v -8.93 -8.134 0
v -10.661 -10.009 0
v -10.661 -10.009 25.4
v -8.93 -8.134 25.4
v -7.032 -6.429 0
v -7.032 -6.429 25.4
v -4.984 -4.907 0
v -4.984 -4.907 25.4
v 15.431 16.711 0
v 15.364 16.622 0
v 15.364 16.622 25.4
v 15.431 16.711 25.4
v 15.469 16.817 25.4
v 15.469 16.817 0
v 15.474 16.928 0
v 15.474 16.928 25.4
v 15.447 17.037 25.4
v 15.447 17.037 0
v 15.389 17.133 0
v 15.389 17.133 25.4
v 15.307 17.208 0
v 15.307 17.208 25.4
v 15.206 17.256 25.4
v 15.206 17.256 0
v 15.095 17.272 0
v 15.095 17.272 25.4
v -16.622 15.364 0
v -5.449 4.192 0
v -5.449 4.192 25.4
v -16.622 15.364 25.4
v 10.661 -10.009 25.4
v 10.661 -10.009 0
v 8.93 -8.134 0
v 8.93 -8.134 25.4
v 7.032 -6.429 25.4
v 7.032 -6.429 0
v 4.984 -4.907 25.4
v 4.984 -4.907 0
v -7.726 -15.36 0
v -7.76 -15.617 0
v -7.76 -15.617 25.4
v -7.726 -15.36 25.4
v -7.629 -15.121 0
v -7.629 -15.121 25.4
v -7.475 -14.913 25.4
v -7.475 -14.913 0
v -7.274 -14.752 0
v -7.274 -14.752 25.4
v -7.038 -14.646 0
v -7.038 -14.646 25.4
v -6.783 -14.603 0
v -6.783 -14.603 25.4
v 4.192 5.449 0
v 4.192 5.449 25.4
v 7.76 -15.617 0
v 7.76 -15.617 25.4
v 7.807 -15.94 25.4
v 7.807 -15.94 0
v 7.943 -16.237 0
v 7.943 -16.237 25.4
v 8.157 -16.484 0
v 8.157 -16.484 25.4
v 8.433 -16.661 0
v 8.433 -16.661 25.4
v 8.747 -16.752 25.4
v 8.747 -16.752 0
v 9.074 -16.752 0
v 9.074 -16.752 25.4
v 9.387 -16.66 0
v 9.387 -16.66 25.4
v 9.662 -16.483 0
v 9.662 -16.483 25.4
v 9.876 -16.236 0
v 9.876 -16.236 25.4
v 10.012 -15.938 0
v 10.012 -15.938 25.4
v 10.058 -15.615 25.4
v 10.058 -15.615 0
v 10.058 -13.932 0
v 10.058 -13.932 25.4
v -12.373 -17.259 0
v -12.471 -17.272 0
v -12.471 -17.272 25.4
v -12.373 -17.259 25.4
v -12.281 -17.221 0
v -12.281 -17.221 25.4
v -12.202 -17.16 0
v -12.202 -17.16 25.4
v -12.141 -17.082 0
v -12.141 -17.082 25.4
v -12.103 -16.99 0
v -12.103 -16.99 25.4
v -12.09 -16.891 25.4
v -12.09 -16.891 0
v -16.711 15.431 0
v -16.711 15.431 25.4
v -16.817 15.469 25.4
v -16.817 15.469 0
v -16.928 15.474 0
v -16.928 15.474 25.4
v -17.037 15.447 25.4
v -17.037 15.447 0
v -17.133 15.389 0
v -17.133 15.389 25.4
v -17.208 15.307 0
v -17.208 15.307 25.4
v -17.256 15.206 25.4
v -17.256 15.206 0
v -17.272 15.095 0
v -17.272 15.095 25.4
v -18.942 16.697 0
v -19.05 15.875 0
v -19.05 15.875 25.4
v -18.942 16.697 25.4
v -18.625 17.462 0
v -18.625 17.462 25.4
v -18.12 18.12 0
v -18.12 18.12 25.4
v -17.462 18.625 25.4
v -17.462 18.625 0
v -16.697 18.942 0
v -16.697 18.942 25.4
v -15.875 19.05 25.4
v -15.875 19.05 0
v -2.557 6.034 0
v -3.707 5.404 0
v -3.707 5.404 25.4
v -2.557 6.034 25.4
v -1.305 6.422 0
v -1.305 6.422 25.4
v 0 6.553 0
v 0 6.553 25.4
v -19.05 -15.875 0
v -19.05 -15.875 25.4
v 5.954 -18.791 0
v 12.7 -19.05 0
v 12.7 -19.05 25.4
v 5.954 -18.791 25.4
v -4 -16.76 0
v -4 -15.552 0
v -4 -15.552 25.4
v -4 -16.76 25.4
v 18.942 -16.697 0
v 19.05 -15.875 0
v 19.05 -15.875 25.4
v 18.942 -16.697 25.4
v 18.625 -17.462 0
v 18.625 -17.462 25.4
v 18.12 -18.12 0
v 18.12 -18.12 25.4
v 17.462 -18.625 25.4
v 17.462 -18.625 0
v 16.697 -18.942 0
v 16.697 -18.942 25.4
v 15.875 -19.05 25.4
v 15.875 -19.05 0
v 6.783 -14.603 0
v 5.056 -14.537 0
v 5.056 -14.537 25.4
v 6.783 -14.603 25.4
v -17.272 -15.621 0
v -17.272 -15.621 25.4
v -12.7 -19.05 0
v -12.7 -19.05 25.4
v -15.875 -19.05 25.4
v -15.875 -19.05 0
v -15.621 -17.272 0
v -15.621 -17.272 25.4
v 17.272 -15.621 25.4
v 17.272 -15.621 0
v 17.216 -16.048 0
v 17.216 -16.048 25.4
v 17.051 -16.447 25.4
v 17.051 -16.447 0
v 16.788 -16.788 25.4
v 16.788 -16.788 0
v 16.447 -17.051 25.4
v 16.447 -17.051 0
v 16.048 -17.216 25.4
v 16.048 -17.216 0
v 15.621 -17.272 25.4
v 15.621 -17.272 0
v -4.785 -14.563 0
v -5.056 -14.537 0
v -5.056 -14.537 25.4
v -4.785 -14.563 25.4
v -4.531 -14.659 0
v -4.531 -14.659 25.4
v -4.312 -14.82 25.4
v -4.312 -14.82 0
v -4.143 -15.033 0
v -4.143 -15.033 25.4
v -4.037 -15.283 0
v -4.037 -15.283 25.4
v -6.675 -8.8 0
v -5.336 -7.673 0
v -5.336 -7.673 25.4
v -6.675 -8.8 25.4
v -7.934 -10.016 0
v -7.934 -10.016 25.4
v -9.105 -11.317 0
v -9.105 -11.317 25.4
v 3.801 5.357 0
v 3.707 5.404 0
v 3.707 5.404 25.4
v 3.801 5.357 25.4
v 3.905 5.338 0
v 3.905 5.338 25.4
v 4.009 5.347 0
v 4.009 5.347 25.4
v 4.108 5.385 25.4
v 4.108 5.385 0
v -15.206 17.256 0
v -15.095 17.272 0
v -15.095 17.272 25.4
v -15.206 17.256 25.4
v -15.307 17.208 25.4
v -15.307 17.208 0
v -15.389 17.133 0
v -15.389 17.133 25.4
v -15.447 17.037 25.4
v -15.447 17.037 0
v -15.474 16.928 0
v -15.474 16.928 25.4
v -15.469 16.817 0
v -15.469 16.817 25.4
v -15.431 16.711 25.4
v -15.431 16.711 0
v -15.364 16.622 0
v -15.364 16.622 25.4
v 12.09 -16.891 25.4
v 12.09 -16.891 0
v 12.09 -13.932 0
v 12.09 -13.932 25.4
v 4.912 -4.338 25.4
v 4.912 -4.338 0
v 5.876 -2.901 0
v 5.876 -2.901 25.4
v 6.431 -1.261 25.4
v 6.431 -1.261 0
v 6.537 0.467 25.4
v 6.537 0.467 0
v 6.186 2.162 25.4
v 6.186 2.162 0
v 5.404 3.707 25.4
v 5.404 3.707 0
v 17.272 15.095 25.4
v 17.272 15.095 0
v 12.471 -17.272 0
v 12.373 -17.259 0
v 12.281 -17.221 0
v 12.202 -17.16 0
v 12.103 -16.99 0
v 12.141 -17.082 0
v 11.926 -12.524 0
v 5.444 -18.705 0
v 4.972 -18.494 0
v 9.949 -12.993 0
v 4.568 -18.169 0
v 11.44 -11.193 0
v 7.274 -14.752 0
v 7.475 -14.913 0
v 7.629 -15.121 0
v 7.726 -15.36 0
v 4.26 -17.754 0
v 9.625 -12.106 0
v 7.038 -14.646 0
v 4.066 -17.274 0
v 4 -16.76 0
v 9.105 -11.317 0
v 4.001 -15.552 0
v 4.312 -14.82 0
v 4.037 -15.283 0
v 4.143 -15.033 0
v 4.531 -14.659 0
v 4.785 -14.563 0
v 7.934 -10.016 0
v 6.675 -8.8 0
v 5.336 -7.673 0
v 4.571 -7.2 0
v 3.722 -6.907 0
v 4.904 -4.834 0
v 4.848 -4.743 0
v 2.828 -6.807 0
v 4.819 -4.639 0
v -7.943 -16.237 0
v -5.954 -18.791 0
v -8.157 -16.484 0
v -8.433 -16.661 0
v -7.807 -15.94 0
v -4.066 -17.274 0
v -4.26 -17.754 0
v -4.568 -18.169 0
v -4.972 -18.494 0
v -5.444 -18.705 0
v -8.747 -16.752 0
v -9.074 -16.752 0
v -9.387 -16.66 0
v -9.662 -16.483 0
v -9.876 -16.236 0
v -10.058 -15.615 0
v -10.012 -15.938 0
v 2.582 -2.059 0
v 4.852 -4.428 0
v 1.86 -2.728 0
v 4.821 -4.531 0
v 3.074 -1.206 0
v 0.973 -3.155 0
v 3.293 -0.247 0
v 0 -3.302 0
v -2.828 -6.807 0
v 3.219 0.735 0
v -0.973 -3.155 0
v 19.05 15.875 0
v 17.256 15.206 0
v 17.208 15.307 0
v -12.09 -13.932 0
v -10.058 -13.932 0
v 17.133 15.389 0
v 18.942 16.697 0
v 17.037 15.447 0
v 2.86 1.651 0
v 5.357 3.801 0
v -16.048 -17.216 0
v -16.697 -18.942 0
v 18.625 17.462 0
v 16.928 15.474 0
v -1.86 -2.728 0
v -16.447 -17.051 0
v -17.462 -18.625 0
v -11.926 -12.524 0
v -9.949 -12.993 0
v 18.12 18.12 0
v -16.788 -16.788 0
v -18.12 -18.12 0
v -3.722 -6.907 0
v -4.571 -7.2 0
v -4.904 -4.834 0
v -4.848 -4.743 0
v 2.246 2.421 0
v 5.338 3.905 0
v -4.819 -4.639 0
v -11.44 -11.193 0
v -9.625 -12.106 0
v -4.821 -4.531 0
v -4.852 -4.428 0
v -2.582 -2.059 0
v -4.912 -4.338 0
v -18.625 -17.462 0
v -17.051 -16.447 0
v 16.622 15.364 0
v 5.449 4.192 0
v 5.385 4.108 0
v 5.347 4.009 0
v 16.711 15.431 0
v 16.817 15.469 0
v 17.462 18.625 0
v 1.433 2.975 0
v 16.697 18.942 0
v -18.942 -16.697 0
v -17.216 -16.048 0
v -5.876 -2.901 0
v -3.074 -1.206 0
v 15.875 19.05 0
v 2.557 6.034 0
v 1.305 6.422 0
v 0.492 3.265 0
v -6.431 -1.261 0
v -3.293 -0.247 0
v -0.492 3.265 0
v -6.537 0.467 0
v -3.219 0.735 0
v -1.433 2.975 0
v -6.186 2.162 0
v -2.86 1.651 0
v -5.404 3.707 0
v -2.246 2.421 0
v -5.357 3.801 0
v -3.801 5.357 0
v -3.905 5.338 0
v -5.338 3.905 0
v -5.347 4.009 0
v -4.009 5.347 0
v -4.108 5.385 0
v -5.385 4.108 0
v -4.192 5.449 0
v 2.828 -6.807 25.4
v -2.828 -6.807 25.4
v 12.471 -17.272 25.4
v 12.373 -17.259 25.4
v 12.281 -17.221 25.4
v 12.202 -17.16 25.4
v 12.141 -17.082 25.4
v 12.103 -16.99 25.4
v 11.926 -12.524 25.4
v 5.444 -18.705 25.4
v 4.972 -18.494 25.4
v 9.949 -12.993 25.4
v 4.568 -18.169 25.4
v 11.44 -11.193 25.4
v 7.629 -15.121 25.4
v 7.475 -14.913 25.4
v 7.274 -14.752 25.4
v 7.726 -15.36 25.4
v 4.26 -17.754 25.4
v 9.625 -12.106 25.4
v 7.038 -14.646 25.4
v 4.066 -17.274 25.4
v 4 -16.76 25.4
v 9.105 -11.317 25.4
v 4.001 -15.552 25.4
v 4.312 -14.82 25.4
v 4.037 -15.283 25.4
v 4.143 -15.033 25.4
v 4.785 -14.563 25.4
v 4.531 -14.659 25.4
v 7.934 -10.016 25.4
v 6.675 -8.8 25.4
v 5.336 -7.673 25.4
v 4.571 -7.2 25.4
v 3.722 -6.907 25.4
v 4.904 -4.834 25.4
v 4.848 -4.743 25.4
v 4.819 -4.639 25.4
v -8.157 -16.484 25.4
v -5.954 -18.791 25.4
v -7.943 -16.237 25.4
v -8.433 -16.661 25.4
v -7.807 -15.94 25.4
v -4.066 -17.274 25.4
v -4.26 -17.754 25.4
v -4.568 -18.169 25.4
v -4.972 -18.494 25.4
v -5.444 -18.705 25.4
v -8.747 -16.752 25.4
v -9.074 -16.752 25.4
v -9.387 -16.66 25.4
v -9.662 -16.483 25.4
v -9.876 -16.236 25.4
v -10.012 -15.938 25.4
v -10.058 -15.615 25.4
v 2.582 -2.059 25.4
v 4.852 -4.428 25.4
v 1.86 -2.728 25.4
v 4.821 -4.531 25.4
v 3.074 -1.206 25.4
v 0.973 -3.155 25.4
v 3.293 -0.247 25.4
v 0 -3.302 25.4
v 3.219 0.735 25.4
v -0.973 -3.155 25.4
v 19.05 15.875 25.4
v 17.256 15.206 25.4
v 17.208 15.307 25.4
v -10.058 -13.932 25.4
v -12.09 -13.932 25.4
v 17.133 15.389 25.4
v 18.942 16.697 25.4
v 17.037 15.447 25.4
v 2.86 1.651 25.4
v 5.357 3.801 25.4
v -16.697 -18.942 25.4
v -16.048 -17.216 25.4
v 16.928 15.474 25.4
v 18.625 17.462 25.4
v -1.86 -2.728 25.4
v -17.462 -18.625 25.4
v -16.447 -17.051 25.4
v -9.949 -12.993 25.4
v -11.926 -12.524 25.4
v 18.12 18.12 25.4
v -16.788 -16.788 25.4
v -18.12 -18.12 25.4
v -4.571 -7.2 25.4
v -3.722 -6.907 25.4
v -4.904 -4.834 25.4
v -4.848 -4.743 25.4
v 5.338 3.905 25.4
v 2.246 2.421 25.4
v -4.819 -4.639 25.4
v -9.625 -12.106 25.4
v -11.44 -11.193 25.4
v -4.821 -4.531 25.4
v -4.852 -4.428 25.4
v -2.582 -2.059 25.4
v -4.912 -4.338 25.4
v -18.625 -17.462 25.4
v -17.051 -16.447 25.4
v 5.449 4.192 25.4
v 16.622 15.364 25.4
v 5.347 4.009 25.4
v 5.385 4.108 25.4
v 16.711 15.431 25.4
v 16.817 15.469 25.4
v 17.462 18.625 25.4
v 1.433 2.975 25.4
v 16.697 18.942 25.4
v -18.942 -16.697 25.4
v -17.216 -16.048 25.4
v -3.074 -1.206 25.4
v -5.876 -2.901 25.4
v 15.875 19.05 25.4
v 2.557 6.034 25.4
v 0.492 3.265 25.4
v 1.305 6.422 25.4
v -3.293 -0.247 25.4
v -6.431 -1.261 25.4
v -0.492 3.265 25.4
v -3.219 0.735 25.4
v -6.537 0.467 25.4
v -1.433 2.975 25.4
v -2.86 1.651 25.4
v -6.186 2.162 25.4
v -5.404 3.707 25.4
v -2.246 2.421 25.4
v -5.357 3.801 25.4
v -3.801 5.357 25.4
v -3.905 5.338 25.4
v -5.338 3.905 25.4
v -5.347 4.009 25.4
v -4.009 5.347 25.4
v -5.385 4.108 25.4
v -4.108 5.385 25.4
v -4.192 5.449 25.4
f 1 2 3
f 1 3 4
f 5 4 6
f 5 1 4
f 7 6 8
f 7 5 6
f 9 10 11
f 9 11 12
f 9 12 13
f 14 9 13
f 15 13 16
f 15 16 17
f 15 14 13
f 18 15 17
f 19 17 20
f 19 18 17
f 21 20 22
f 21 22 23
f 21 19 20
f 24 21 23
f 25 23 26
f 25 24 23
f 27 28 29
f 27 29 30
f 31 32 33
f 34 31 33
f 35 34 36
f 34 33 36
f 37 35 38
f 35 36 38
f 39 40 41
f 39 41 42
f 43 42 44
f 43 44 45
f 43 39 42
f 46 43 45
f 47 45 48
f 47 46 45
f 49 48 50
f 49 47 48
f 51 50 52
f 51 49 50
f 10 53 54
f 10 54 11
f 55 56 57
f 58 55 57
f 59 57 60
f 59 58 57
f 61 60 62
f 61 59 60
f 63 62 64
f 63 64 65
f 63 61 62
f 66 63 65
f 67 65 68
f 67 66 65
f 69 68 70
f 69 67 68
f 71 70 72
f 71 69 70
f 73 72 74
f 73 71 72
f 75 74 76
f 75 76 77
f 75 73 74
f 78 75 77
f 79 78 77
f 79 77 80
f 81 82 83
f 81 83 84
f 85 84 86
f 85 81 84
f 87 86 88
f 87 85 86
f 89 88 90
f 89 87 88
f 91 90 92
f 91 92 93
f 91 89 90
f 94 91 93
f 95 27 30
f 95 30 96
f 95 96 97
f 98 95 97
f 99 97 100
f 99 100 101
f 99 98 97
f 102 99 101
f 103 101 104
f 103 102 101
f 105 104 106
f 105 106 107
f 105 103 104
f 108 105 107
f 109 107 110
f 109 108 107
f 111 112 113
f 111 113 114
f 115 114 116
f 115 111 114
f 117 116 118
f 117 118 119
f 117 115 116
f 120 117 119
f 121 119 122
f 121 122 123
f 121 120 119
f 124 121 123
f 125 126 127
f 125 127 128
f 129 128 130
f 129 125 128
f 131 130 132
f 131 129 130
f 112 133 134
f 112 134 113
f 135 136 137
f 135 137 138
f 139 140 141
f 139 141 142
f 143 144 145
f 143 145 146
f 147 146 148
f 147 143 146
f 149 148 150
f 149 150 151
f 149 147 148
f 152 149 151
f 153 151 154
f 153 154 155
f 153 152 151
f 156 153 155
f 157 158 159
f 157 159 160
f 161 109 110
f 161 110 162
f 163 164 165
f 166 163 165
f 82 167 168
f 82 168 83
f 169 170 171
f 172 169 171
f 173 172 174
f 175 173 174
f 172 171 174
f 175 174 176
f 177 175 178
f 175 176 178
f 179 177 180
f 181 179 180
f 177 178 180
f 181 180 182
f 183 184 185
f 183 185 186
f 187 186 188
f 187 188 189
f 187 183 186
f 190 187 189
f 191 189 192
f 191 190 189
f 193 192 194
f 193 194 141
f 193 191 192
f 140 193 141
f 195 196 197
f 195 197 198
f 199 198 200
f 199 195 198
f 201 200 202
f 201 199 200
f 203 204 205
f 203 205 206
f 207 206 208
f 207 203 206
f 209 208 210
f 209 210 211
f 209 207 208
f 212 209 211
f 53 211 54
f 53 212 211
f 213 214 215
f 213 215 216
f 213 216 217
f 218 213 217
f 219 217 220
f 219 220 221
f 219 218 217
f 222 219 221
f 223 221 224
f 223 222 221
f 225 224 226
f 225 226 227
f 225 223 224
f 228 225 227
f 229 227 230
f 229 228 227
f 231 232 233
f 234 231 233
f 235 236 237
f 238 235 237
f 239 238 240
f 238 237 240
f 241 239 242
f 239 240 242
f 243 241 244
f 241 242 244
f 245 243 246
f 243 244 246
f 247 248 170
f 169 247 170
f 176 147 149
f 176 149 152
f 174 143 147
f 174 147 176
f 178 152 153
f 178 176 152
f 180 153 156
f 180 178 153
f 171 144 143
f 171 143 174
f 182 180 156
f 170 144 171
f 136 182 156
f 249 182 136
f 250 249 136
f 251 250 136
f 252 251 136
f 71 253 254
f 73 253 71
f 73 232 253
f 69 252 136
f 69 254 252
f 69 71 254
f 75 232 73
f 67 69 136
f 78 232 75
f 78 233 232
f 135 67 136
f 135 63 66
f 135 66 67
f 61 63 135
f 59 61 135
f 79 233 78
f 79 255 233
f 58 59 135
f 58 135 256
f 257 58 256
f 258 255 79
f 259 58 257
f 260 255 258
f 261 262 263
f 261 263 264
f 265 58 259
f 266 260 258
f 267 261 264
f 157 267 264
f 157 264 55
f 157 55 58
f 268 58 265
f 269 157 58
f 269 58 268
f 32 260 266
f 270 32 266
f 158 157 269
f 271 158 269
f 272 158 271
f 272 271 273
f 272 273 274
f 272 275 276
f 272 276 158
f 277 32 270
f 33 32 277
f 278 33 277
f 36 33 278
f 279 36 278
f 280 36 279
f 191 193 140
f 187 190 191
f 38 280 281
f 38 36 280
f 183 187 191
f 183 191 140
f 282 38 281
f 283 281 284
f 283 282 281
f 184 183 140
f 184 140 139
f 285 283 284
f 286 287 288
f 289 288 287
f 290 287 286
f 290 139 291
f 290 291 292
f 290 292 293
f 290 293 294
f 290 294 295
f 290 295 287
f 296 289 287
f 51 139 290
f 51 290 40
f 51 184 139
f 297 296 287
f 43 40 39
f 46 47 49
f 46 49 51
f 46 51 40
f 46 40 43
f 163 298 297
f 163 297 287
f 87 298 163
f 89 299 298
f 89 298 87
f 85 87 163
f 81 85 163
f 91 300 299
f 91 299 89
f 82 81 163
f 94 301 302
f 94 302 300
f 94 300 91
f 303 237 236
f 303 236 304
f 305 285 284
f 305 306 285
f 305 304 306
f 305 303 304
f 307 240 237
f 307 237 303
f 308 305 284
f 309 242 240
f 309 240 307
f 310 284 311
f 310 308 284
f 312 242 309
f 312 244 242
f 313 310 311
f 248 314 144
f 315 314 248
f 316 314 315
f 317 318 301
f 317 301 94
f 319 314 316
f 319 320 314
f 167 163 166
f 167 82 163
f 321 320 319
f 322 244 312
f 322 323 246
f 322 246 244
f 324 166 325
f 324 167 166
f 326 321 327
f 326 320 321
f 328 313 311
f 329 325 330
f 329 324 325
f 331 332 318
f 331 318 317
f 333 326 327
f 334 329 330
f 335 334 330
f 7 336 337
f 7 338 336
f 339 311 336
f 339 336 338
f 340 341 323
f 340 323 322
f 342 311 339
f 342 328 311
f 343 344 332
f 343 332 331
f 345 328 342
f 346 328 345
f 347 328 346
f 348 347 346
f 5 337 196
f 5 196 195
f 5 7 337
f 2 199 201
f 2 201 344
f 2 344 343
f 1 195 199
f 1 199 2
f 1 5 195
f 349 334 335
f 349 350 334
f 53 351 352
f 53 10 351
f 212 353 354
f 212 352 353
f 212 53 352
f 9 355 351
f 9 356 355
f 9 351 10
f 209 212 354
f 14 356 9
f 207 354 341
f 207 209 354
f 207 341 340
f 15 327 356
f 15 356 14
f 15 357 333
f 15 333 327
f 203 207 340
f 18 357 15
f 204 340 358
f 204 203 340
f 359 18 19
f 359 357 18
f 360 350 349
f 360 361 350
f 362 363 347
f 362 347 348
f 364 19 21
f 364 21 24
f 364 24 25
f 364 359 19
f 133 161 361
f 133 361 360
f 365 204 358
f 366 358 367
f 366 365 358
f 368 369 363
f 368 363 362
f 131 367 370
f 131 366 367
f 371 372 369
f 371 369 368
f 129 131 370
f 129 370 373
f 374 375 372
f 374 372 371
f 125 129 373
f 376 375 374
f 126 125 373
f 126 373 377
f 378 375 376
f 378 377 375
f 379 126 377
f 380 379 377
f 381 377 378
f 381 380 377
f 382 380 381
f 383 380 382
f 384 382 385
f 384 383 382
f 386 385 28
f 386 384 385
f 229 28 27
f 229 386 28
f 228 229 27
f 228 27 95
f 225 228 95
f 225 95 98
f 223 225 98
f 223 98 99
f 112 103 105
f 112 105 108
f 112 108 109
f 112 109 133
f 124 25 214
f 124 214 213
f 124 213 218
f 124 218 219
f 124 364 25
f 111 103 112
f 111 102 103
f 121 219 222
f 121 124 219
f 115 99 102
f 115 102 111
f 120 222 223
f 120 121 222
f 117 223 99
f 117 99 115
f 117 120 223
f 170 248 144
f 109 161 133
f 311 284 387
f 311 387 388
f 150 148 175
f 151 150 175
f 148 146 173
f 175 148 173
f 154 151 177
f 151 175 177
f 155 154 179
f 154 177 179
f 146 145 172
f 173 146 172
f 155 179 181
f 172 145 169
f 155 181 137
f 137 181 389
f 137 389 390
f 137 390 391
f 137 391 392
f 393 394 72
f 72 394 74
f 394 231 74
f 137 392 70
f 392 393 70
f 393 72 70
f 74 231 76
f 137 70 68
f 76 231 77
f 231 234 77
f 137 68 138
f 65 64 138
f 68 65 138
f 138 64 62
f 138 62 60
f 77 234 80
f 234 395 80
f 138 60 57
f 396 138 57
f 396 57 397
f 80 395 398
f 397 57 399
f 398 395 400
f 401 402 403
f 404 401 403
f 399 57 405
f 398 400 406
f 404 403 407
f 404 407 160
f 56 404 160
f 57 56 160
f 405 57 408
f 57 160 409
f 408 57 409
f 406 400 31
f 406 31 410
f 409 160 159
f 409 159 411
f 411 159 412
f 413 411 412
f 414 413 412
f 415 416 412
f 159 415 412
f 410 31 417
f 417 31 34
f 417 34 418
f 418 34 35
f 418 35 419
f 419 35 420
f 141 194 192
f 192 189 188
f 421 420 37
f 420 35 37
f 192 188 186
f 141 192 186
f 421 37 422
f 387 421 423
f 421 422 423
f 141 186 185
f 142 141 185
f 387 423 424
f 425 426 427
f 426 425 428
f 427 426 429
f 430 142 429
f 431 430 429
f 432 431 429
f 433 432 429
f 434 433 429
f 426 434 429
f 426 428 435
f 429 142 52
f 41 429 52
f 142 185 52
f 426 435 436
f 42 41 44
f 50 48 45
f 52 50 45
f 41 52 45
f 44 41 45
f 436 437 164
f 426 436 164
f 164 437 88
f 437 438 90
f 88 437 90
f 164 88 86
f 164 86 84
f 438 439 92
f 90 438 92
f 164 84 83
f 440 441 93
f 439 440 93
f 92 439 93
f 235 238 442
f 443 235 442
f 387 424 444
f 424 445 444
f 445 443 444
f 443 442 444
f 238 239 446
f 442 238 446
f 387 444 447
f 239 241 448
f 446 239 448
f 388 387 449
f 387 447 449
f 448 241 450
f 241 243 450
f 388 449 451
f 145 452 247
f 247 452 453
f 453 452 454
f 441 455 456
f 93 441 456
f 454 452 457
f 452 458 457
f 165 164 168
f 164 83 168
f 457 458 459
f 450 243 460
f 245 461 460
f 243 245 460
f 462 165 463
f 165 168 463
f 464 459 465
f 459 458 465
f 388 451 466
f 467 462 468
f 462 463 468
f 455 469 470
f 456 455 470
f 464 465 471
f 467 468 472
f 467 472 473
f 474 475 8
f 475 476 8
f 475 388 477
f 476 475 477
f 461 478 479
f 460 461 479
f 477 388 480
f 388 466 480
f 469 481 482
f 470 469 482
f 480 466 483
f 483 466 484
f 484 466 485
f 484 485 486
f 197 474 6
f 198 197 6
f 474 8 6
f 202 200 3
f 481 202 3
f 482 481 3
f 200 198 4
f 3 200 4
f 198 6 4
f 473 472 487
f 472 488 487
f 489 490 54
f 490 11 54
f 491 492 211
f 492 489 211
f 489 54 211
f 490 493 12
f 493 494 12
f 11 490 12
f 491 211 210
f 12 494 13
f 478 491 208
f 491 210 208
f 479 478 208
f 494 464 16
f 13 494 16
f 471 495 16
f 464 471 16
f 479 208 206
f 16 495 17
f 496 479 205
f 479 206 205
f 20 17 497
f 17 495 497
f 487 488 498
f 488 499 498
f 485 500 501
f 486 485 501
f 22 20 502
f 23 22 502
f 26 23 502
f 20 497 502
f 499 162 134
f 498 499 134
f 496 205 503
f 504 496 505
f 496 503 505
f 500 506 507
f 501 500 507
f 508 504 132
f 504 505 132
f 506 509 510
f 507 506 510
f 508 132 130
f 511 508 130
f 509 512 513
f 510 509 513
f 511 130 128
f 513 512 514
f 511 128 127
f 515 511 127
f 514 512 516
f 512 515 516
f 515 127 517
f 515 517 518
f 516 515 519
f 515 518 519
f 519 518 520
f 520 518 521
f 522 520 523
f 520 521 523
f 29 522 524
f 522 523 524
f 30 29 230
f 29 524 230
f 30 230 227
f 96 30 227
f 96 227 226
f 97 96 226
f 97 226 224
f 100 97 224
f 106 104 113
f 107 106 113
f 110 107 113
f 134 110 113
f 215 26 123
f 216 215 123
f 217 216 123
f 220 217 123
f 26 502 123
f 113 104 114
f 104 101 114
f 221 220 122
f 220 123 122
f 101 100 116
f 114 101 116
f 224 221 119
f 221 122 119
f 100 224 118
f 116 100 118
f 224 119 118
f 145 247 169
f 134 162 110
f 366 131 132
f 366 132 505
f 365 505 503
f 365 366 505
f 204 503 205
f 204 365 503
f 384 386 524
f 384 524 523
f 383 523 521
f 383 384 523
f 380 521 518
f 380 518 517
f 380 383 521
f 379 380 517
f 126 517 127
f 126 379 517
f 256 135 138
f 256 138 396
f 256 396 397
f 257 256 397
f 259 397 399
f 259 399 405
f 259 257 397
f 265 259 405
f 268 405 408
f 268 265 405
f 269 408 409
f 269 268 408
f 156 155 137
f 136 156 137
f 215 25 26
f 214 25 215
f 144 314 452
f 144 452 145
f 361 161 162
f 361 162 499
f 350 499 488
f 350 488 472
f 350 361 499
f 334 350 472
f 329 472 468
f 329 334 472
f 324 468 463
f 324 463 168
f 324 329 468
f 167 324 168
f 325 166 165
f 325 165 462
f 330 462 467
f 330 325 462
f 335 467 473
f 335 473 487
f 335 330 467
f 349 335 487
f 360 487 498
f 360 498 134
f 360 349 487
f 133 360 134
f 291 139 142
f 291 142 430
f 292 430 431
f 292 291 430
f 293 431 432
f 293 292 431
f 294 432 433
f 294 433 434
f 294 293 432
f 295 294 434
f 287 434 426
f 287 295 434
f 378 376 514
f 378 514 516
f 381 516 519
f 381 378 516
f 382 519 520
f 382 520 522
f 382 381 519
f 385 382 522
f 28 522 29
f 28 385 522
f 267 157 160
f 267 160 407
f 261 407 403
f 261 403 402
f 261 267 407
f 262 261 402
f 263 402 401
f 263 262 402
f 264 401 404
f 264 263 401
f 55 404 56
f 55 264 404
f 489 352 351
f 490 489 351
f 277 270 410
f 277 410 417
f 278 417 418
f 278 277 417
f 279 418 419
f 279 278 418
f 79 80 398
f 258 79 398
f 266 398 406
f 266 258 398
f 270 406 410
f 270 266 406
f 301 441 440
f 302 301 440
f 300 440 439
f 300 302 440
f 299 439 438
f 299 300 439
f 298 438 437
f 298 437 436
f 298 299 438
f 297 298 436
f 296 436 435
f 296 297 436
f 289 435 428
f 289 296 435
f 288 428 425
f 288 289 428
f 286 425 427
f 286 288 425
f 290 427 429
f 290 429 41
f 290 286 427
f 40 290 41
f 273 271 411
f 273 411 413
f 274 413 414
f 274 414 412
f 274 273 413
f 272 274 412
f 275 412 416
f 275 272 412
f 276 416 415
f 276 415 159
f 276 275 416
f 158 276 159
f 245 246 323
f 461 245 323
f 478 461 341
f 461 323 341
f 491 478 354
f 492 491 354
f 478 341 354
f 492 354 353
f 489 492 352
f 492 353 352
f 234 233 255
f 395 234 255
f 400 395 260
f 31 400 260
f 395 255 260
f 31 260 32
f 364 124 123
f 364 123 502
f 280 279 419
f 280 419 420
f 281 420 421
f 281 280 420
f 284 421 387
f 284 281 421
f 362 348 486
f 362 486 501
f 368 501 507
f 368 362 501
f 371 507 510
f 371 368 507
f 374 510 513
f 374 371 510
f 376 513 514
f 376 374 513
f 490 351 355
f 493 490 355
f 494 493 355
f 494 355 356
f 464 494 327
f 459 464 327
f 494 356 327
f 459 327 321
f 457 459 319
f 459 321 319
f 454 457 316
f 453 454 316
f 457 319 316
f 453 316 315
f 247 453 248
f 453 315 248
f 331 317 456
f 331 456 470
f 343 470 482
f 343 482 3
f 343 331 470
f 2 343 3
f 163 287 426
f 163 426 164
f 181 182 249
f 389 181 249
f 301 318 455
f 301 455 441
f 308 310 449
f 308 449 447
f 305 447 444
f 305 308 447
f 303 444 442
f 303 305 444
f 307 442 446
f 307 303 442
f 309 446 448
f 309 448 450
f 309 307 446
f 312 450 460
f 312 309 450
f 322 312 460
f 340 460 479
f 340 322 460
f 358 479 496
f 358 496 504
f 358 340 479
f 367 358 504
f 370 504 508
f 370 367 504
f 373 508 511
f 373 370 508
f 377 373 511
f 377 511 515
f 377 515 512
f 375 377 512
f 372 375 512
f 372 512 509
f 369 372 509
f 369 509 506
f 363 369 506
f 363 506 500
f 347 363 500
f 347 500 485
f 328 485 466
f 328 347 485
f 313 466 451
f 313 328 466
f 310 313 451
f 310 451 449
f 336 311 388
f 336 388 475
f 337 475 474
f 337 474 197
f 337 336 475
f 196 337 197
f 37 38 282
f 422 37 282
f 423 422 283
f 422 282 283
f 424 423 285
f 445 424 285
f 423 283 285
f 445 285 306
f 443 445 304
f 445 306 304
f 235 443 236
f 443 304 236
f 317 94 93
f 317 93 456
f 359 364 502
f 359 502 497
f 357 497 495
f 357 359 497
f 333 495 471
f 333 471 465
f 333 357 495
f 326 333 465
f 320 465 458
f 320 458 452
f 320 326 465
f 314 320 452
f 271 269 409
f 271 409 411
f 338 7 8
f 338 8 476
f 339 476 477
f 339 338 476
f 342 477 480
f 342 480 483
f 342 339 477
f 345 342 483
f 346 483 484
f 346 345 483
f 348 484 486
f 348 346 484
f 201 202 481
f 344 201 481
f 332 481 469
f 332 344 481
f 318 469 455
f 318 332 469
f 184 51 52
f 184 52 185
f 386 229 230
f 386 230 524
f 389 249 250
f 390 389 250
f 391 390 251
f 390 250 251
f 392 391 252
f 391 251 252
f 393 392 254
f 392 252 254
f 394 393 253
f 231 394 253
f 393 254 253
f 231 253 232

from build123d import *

# Parameters (mm, degrees)
EXTRUDE1_DEPTH = 25.4


with BuildPart() as part:
    # Sketch1 → Extrude1 (new body)
    with BuildSketch(Plane.XY):
        with BuildLine():
            Line((2.828100791, -6.8072), (0, -6.8072))
            Line((0, -6.8072), (-2.828100791, -6.8072))
            ThreePointArc((-2.828100791, -6.8072), (-4.154656747, -7.029801128), (-5.335891418, -7.673219048))
            ThreePointArc((-5.335891418, -7.673219048), (-7.314841404, -9.397406099), (-9.105295238, -11.316608824))
            ThreePointArc((-9.105295238, -11.316608824), (-9.812696364, -12.53999053), (-10.0584, -13.931647412))
            Line((-10.0584, -13.931647412), (-10.0584, -15.614648356))
            ThreePointArc((-10.0584, -15.614648356), (-8.91004969, -16.763999564), (-7.759698458, -15.616651022))
            ThreePointArc((-7.759698458, -15.616651022), (-7.475165883, -14.913287543), (-6.782702014, -14.603170209))
            Line((-6.782702014, -14.603170209), (-5.055502014, -14.536817878))
            ThreePointArc((-5.055502014, -14.536817878), (-4.312003742, -14.819989072), (-4.0005, -15.552069001))
            Line((-4.0005, -15.552069001), (-4.0005, -16.760361628))
            ThreePointArc((-4.0005, -16.760361628), (-4.568340141, -18.169354143), (-5.954495972, -18.790863874))
            Line((-5.954495972, -18.790863874), (-12.7, -19.05))
            Line((-12.7, -19.05), (-15.875, -19.05))
            ThreePointArc((-15.875, -19.05), (-18.12006403, -18.12006403), (-19.05, -15.875))
            Line((-19.05, -15.875), (-19.05, 15.875))
            ThreePointArc((-19.05, 15.875), (-18.12006403, 18.12006403), (-15.875, 19.05))
            Line((-15.875, 19.05), (0, 19.05))
            Line((0, 19.05), (15.875, 19.05))
            ThreePointArc((15.875, 19.05), (18.12006403, 18.12006403), (19.05, 15.875))
            Line((19.05, 15.875), (19.05, -15.875))
            ThreePointArc((19.05, -15.875), (18.12006403, -18.12006403), (15.875, -19.05))
            Line((15.875, -19.05), (12.7, -19.05))
            Line((12.7, -19.05), (5.954495972, -18.790863874))
            ThreePointArc((5.954495972, -18.790863874), (4.568340141, -18.169354143), (4.0005, -16.760361628))
            Line((4.0005, -16.760361628), (4.0005, -15.552069001))
            ThreePointArc((4.0005, -15.552069001), (4.312003742, -14.819989072), (5.055502014, -14.536817878))
            Line((5.055502014, -14.536817878), (6.782702014, -14.603170209))
            ThreePointArc((6.782702014, -14.603170209), (7.475165883, -14.913287543), (7.759698458, -15.616651022))
            ThreePointArc((7.759698458, -15.616651022), (8.91004969, -16.763999564), (10.0584, -15.614648356))
            Line((10.0584, -15.614648356), (10.0584, -13.931647412))
            ThreePointArc((10.0584, -13.931647412), (9.812696364, -12.53999053), (9.105295238, -11.316608824))
            ThreePointArc((9.105295238, -11.316608824), (7.314841404, -9.397406099), (5.335891418, -7.673219048))
            ThreePointArc((5.335891418, -7.673219048), (4.154656747, -7.029801128), (2.828100791, -6.8072))
        make_face()
        with BuildLine():
            Line((4.191663684, 5.448899541), (15.364356459, 16.621592316))
            ThreePointArc((15.364356459, 16.621592316), (15.446946878, 17.036802388), (15.094948776, 17.272))
            Line((15.094948776, 17.272), (0, 17.272))
            Line((0, 17.272), (-15.094948776, 17.272))
            ThreePointArc((-15.094948776, 17.272), (-15.446946878, 17.036802388), (-15.364356459, 16.621592316))
            Line((-15.364356459, 16.621592316), (-4.191663684, 5.448899541))
            ThreePointArc((-4.191663684, 5.448899541), (-3.957294594, 5.338921804), (-3.706747429, 5.40411452))
            ThreePointArc((-3.706747429, 5.40411452), (-1.940384881, 6.259339962), (0, 6.5532))
            ThreePointArc((0, 6.5532), (1.940384881, 6.259339962), (3.706747429, 5.40411452))
            ThreePointArc((3.706747429, 5.40411452), (3.957294594, 5.338921804), (4.191663684, 5.448899541))
        make_face(mode=Mode.SUBTRACT)
        with BuildLine():
            Line((-17.272, 15.094948776), (-17.272, -15.621))
            ThreePointArc((-17.272, -15.621), (-16.788433296, -16.788433296), (-15.621, -17.272))
            Line((-15.621, -17.272), (-12.4714, -17.272))
            ThreePointArc((-12.4714, -17.272), (-12.201992316, -17.160407684), (-12.0904, -16.891))
            Line((-12.0904, -16.891), (-12.0904, -13.931647412))
            ThreePointArc((-12.0904, -13.931647412), (-11.721844546, -11.84416209), (-10.660742857, -10.00908953))
            ThreePointArc((-10.660742857, -10.00908953), (-8.000870719, -7.259428949), (-4.984332303, -4.906547928))
            ThreePointArc((-4.984332303, -4.906547928), (-4.819224111, -4.638901343), (-4.91158257, -4.338293085))
            ThreePointArc((-4.91158257, -4.338293085), (-6.540953358, -0.40044901), (-5.40411452, 3.706747429))
            ThreePointArc((-5.40411452, 3.706747429), (-5.338921804, 3.957294594), (-5.448899541, 4.191663684))
            Line((-5.448899541, 4.191663684), (-16.621592316, 15.364356459))
            ThreePointArc((-16.621592316, 15.364356459), (-17.036802388, 15.446946878), (-17.272, 15.094948776))
        make_face(mode=Mode.SUBTRACT)
        with BuildLine():
            Line((17.272, 15.094948776), (17.272, -15.621))
            ThreePointArc((17.272, -15.621), (16.788433296, -16.788433296), (15.621, -17.272))
            Line((15.621, -17.272), (12.4714, -17.272))
            ThreePointArc((12.4714, -17.272), (12.201992316, -17.160407684), (12.0904, -16.891))
            Line((12.0904, -16.891), (12.0904, -13.931647412))
            ThreePointArc((12.0904, -13.931647412), (11.721844546, -11.84416209), (10.660742857, -10.00908953))
            ThreePointArc((10.660742857, -10.00908953), (8.000870719, -7.259428949), (4.984332303, -4.906547928))
            ThreePointArc((4.984332303, -4.906547928), (4.819224111, -4.638901343), (4.91158257, -4.338293085))
            ThreePointArc((4.91158257, -4.338293085), (6.540953358, -0.40044901), (5.40411452, 3.706747429))
            ThreePointArc((5.40411452, 3.706747429), (5.338921804, 3.957294594), (5.448899541, 4.191663684))
            Line((5.448899541, 4.191663684), (16.621592316, 15.364356459))
            ThreePointArc((16.621592316, 15.364356459), (17.036802388, 15.446946878), (17.272, 15.094948776))
        make_face(mode=Mode.SUBTRACT)
        with BuildLine():
            ThreePointArc((0, 3.302), (-3.302, 0), (0, -3.302))
            ThreePointArc((0, -3.302), (3.302, 0), (0, 3.302))
        make_face(mode=Mode.SUBTRACT)
    extrude(amount=EXTRUDE1_DEPTH)


solid = part.part
